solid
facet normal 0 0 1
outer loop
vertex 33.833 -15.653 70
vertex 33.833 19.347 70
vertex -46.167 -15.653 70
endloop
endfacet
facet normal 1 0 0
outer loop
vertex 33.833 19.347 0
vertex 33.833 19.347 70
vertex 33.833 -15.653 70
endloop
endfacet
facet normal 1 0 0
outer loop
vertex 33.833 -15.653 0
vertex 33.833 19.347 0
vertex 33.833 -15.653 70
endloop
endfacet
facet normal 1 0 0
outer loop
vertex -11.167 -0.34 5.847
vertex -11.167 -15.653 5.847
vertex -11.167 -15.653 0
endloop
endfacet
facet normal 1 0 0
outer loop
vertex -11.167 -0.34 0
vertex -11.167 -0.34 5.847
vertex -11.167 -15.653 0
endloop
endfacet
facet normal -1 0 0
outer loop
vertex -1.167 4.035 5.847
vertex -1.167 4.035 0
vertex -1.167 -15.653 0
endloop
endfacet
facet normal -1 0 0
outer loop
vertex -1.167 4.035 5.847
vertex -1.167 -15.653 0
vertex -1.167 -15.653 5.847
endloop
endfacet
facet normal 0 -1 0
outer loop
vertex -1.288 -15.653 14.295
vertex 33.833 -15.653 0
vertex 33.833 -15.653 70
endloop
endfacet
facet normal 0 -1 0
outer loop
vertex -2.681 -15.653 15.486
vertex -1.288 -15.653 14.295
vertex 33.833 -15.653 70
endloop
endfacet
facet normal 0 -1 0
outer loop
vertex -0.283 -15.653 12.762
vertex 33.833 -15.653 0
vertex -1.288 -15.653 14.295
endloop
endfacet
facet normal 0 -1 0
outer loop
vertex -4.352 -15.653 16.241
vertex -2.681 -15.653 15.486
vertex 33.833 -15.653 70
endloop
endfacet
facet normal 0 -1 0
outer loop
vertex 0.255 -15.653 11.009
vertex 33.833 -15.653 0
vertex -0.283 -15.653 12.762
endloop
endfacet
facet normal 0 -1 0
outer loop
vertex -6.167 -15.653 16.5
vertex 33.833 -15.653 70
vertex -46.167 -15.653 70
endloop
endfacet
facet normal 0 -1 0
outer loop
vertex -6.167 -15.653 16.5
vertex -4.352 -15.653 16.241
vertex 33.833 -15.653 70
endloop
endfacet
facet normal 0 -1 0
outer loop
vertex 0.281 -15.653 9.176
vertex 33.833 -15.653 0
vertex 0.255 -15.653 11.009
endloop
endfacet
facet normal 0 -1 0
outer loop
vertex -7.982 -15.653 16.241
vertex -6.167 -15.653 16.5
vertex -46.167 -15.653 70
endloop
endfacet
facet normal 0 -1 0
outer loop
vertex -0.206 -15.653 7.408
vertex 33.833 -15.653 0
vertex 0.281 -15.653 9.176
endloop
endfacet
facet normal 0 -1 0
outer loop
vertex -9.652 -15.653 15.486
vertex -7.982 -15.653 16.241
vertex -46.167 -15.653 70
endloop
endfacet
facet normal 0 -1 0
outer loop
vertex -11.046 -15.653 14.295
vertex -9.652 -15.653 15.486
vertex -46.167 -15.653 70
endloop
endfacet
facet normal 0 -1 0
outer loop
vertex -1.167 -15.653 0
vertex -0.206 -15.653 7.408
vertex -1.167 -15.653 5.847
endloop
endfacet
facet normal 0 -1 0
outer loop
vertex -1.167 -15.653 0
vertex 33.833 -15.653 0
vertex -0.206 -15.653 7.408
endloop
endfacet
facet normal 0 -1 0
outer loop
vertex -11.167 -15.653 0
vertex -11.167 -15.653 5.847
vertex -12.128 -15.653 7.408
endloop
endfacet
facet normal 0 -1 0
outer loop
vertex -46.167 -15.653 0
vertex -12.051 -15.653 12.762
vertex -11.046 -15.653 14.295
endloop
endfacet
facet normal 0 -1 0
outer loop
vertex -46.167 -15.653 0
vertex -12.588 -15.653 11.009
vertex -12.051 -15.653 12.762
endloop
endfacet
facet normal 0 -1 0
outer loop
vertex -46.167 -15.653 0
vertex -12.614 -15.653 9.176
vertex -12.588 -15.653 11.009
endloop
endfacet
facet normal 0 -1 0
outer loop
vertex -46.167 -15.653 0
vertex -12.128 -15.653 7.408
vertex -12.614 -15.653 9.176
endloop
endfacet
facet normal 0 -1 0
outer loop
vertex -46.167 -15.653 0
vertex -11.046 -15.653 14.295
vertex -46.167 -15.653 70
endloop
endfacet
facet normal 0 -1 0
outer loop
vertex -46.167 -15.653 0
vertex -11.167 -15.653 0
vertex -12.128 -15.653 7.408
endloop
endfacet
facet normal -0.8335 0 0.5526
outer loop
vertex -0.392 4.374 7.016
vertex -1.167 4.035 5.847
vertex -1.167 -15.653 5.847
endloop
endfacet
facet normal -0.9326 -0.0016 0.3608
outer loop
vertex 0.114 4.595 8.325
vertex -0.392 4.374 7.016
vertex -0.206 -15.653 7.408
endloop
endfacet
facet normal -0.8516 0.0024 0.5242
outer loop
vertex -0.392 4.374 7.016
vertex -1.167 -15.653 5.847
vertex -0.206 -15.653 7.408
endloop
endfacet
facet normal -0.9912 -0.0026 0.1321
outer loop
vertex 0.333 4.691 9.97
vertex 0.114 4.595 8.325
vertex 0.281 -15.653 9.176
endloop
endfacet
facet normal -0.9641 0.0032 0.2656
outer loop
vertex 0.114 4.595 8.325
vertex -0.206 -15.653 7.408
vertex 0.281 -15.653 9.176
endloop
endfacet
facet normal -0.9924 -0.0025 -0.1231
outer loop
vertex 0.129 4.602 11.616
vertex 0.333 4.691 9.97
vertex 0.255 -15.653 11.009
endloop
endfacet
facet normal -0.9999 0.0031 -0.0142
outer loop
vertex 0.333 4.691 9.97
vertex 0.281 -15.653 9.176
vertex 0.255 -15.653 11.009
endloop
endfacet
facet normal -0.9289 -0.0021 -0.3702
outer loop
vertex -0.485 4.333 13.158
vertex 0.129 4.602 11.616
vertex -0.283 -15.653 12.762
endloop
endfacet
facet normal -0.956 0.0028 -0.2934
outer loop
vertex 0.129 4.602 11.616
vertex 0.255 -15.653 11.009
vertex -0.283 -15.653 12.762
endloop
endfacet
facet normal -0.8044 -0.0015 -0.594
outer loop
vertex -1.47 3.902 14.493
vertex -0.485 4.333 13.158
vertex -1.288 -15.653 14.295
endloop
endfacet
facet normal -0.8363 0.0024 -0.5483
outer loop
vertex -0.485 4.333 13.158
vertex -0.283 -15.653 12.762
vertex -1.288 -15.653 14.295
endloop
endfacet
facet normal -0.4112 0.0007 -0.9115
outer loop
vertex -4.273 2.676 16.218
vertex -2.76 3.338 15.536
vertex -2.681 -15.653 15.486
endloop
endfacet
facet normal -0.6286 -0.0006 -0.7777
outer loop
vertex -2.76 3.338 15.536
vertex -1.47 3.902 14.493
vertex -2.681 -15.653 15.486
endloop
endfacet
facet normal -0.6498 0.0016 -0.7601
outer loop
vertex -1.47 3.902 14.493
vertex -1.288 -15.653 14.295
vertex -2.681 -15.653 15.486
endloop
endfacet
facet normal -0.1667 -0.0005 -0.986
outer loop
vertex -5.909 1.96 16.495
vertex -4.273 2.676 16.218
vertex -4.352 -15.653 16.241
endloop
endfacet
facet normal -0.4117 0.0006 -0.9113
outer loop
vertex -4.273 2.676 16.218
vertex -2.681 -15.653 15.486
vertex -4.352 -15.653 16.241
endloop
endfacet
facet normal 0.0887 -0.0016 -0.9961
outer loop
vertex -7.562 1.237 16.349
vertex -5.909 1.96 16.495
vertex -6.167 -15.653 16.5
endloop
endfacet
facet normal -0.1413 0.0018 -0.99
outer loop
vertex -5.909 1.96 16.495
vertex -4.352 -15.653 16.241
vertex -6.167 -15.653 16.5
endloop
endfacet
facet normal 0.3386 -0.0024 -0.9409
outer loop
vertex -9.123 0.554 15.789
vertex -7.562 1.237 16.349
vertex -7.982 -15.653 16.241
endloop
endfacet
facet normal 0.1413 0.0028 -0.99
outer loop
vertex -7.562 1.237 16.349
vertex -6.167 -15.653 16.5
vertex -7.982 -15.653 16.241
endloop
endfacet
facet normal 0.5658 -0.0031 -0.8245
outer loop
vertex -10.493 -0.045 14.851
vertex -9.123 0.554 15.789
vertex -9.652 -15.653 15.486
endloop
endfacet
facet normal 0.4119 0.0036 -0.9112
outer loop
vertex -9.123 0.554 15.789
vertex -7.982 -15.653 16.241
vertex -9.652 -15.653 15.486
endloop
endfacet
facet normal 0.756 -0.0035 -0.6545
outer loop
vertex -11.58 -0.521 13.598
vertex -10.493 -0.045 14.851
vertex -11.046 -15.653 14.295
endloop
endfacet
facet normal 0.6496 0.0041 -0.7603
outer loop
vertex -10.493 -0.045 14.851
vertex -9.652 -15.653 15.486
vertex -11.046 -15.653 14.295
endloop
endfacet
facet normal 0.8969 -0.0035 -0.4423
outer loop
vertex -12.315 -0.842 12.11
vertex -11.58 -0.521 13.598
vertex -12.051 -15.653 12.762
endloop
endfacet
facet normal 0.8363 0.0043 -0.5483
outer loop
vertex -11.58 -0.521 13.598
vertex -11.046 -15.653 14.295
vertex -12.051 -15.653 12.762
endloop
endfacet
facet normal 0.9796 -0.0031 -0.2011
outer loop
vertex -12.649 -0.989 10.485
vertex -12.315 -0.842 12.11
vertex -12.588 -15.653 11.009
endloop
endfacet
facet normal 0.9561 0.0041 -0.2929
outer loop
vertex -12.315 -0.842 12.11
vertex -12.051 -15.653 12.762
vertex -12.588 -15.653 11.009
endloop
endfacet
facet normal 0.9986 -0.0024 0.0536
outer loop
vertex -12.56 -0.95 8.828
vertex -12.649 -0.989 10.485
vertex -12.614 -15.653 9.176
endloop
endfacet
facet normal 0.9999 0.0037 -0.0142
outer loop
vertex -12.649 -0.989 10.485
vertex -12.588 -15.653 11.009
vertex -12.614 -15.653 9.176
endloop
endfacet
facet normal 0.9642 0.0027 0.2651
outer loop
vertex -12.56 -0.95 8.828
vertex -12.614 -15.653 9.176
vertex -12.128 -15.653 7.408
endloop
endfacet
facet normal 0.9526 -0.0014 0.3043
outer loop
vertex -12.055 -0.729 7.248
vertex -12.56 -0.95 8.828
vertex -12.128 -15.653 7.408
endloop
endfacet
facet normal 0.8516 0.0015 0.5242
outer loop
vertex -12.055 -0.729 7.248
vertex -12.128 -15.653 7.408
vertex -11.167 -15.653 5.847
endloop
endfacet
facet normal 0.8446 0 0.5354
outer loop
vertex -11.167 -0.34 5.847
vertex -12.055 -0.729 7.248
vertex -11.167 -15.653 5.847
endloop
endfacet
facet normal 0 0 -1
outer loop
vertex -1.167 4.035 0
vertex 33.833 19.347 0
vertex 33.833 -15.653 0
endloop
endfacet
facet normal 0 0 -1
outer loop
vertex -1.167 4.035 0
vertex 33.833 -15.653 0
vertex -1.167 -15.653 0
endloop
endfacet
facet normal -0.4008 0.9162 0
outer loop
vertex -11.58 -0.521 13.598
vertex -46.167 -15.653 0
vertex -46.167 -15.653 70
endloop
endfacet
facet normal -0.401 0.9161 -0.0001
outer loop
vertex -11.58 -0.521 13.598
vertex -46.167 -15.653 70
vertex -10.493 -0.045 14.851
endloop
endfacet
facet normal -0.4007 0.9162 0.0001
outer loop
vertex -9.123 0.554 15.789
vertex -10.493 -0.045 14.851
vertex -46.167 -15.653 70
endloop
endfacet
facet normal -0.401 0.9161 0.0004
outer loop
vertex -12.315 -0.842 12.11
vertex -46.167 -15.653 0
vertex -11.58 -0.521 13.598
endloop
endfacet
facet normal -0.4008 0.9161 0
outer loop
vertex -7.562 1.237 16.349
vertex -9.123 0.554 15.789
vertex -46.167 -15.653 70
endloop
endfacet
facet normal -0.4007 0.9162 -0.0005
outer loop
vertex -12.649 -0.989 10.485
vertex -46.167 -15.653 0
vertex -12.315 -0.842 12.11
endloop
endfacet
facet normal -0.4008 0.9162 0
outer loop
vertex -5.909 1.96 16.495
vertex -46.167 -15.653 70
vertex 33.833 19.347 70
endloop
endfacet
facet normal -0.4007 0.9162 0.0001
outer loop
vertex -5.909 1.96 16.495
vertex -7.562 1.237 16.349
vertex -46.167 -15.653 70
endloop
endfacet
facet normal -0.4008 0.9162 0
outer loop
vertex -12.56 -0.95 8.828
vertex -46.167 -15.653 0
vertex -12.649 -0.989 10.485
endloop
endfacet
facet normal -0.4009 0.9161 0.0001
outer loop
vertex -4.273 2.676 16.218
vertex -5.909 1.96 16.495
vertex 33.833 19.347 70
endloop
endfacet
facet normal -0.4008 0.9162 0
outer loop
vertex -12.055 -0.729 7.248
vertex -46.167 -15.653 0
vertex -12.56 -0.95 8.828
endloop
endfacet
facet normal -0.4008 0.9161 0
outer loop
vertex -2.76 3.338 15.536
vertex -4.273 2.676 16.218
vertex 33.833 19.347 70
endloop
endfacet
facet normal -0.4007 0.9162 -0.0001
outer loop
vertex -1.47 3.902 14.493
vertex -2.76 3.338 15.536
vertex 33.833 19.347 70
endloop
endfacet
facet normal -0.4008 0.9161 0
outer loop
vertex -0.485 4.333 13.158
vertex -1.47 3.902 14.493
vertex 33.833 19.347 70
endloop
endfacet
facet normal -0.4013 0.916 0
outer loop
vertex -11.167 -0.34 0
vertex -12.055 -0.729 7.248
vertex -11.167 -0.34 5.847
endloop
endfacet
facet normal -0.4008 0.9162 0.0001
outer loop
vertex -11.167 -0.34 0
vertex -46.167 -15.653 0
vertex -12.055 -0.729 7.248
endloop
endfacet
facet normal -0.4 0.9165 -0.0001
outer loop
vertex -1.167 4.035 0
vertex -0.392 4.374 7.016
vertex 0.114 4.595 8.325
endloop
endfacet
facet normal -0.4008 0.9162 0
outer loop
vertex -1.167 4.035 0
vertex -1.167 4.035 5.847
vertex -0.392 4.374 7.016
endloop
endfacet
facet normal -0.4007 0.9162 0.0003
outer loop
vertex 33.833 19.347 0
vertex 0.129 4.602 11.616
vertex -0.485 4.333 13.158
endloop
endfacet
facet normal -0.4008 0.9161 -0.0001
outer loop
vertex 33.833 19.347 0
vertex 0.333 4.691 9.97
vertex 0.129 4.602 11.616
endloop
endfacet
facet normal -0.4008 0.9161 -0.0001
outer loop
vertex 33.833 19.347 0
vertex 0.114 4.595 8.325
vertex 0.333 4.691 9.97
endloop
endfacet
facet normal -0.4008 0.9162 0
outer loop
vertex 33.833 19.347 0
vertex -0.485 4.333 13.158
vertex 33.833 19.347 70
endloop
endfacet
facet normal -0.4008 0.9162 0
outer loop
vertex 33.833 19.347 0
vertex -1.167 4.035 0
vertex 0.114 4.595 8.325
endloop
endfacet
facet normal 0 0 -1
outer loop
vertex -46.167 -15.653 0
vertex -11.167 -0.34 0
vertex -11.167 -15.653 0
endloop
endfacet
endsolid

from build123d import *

# Parameters (mm, degrees)
RESSALTO_EXTRUS_O1_DEPTH = 70
CORTE_EXTRUS_O1_DEPTH    = 70


with BuildPart() as part:
    # Esboço1 → Ressalto-extrusão1 (new body)
    with BuildSketch(Plane.XY):
        Polygon((-46.166666667, -15.652777778), (33.833333333, 19.347222222), (33.833333333, -15.652777778), align=None)
    extrude(amount=RESSALTO_EXTRUS_O1_DEPTH)

    # Esboço2 → Corte-extrusão1 (cut)
    with BuildSketch(Plane.XZ.offset(15.652777778)):
        with BuildLine():
            Line((-11.166666667, 0), (-1.166666667, 0))
            Line((-1.166666667, 0), (-1.166666667, 5.846688069))
            ThreePointArc((-1.166666667, 5.846688069), (-6.166666667, 16.5), (-11.166666667, 5.846688069))
            Line((-11.166666667, 5.846688069), (-11.166666667, 0))
        make_face()
    extrude(amount=-CORTE_EXTRUS_O1_DEPTH, mode=Mode.SUBTRACT)


solid = part.part
